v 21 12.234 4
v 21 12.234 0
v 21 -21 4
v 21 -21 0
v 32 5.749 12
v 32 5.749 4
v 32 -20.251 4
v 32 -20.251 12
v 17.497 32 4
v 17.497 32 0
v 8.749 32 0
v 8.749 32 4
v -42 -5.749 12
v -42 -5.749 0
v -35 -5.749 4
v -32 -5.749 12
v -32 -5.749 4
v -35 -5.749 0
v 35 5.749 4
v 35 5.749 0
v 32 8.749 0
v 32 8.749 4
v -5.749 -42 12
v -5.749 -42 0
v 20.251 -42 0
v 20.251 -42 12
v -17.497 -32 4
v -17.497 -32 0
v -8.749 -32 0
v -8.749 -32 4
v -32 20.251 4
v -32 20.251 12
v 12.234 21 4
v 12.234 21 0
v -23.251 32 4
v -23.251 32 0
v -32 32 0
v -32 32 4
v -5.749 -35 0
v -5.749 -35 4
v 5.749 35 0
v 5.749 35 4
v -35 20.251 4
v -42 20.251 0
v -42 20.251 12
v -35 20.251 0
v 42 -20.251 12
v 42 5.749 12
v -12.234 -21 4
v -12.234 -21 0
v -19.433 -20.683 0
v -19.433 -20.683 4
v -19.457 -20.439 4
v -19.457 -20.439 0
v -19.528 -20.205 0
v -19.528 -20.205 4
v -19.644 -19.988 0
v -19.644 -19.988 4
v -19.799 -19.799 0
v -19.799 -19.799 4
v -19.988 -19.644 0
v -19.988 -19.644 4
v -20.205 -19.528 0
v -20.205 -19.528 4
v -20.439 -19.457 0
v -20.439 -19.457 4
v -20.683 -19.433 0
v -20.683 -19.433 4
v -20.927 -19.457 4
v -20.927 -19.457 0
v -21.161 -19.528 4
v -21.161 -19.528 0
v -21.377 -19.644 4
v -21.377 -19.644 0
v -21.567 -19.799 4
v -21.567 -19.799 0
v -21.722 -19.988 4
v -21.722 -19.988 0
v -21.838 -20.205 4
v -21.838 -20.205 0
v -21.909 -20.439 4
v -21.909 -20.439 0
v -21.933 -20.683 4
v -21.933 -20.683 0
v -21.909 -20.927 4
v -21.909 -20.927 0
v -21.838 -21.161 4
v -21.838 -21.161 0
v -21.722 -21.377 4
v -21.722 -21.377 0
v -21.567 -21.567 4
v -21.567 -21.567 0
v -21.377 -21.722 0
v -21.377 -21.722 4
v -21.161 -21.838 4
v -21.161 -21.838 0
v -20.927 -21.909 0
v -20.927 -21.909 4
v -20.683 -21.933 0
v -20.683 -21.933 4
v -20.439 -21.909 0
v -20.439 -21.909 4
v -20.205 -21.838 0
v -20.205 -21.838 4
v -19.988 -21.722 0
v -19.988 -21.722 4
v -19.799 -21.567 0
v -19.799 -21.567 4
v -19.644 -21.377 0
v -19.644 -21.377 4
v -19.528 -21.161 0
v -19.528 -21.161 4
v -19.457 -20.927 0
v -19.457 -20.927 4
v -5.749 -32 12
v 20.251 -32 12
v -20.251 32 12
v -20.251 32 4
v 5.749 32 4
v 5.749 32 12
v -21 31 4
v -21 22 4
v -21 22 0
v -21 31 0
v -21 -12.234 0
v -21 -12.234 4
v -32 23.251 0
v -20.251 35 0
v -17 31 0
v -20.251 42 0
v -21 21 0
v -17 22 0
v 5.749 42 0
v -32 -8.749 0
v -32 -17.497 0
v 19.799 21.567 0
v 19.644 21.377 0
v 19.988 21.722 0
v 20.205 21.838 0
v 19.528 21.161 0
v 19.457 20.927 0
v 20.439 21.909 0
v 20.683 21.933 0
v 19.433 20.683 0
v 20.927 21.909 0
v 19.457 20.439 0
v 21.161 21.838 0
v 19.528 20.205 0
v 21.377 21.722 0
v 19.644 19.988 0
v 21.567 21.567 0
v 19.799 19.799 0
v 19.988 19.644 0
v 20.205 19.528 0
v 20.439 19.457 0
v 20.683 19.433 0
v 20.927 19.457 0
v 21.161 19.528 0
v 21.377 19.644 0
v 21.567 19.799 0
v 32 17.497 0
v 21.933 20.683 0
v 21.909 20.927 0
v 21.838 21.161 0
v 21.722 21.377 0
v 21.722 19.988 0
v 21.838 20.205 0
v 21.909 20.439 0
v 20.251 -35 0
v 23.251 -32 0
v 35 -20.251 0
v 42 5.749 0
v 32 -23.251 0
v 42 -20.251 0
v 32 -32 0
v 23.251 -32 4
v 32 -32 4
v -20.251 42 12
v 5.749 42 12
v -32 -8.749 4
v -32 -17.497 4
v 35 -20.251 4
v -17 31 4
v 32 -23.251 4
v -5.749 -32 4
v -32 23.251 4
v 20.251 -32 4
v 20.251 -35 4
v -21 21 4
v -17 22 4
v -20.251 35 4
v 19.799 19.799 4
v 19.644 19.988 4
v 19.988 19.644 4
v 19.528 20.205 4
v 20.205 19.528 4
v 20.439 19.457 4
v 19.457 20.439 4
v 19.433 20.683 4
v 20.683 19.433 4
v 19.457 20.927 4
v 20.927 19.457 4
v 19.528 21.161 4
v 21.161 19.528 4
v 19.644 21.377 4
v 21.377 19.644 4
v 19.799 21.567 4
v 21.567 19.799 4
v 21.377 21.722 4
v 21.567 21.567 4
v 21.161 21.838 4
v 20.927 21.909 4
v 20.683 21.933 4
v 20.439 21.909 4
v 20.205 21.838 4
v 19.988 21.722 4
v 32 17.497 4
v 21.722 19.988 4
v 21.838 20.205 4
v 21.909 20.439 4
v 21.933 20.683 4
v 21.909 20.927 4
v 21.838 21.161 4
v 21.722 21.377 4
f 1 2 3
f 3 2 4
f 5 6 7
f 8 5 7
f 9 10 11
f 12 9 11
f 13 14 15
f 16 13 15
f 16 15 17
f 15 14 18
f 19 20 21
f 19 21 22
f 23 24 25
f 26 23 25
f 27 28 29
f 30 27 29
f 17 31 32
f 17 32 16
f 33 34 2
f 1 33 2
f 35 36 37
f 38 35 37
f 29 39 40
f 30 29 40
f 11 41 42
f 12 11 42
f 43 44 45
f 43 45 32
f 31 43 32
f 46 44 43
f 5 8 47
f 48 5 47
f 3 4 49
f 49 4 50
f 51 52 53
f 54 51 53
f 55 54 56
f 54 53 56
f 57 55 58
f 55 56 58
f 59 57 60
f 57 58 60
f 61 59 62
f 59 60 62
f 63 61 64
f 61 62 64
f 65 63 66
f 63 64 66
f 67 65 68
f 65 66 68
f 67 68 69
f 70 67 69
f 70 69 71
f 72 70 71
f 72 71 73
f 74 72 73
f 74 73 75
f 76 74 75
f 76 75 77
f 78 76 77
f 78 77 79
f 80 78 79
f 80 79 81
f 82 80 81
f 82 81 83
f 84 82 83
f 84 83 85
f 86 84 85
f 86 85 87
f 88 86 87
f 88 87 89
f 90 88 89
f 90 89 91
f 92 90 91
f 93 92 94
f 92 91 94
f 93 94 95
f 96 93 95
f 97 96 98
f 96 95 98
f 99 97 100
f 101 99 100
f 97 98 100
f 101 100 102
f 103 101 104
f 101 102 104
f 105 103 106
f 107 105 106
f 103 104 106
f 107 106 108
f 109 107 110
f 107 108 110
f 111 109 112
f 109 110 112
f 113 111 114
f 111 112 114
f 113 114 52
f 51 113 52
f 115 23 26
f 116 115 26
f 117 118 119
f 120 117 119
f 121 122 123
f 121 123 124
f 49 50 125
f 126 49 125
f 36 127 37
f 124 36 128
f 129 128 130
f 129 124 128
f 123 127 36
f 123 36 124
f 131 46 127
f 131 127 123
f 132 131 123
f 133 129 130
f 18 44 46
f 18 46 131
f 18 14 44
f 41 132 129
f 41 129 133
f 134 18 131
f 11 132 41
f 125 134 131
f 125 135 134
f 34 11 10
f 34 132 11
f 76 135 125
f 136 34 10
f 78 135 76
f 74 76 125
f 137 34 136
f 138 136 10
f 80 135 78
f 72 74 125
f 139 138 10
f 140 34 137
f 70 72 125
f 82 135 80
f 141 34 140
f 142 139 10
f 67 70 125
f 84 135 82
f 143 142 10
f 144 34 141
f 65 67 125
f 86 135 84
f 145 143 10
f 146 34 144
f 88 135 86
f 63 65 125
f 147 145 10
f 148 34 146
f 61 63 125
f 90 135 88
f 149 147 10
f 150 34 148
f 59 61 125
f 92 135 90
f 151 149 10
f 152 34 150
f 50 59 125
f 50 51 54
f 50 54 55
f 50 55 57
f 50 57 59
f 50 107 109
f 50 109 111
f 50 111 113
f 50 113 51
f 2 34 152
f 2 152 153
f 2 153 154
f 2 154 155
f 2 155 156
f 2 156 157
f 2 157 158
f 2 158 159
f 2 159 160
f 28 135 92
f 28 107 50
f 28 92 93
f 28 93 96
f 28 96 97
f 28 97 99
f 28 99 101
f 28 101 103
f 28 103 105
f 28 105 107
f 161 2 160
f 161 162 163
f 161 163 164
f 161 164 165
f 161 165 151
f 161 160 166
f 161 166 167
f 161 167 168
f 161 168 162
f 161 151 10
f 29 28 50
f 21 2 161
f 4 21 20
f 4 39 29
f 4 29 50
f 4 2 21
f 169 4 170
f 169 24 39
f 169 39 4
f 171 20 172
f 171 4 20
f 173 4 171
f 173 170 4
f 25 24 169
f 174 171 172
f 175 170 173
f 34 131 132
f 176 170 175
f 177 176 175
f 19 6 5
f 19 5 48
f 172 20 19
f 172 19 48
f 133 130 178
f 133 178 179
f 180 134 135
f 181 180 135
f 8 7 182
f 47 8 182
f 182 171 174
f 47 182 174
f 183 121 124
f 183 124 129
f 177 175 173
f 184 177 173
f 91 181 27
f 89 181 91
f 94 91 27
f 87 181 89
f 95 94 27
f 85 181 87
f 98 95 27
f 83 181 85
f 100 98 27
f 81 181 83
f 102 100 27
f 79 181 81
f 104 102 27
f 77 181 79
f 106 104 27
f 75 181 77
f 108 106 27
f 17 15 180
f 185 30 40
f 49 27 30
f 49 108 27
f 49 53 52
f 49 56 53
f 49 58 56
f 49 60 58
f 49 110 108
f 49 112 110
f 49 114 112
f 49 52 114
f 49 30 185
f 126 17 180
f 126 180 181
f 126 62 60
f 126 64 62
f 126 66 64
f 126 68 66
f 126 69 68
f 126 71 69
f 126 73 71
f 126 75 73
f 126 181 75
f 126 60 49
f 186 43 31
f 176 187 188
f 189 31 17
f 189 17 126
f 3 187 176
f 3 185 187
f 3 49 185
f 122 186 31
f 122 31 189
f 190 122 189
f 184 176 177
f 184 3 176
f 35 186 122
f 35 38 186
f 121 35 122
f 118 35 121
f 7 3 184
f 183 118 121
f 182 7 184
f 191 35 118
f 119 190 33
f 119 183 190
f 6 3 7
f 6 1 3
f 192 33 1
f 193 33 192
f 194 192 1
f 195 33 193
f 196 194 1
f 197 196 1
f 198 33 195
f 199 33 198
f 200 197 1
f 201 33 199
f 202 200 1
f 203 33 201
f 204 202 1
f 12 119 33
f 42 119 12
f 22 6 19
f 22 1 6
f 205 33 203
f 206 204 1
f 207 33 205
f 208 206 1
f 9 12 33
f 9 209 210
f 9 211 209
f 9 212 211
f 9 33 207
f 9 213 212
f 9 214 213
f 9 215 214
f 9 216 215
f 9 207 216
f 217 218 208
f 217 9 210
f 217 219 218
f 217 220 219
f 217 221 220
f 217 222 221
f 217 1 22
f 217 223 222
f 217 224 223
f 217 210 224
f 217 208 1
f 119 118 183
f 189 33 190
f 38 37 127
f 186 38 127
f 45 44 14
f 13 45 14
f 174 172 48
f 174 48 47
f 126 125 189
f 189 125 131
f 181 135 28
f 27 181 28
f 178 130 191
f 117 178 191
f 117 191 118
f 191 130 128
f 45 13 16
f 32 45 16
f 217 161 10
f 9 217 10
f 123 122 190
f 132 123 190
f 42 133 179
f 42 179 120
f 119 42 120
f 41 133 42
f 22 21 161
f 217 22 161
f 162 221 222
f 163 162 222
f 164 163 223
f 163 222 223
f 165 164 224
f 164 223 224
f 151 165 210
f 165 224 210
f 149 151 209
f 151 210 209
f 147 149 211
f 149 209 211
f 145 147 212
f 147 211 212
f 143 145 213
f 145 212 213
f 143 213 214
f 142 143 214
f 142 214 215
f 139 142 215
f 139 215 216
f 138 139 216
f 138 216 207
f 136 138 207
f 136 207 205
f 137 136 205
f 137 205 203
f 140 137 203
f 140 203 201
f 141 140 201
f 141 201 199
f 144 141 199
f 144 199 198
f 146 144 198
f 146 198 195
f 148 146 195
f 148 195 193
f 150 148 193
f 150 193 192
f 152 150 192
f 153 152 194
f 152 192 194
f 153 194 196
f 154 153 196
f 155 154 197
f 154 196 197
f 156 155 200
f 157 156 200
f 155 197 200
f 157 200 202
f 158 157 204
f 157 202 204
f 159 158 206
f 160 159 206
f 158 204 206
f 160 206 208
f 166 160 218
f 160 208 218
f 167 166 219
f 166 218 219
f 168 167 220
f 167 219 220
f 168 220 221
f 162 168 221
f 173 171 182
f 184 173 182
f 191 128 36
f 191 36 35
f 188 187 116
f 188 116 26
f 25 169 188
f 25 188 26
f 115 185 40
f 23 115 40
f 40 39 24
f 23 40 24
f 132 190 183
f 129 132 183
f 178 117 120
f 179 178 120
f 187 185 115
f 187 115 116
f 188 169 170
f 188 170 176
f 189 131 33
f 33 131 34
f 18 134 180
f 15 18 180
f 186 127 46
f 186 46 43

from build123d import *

# Parameters (mm, degrees)
F1_DEPTH = 4
F2_R     = 1.25
F3_DEPTH = 4.001
F4_W     = 4
F4_H     = 9
F5_DEPTH = 4.001
F6_W     = 10
F6_H     = 26
F6_W_2   = 26
F6_H_2   = 10
F7_DEPTH = 12
F8_SIZE  = 3


with BuildPart() as f1:
    # F0 (on Top) → F1 (new body)
    with BuildSketch(Plane.XY):
        Polygon((17.4974746831, 32), (-32, 32), (-32, -17.4974746831), (-17.4974746831, -32), (32, -32), (32, 17.4974746831), align=None)
        Polygon((-21, -12.2340187158), (-21, 21), (12.2340187158, 21), (21, 21), (21, 12.2340187158), (21, -21), (-12.2340187158, -21), (-21, -21), align=None, mode=Mode.SUBTRACT)
        Polygon((-12.2340187158, -21), (-21, -12.2340187158), (-21, -21), align=None)
        Polygon((21, 21), (12.2340187158, 21), (21, 12.2340187158), align=None)
    extrude(amount=F1_DEPTH)

    # F2 (on face) → F3 (cut, through all)
    with BuildSketch(Plane.XY.offset(4)):
        with Locations((-20.6828733497, -20.6828733497)):
            Circle(F2_R)
        with Locations((20.6828733497, 20.6828733497)):
            Circle(F2_R)
    extrude(amount=-F3_DEPTH, mode=Mode.SUBTRACT)

    # F4 (on face) → F5 (cut, through all)
    with BuildSketch(Plane.XY.offset(4)):
        with Locations((-19, 26.5)):
            Rectangle(F4_W, F4_H)
    extrude(amount=-F5_DEPTH, mode=Mode.SUBTRACT)

    # F6 (on face) → F7 (join)
    with BuildSketch(Plane(origin=(0, 0, 0), x_dir=(1, 0, 0), z_dir=(0, 0, -1))):
        with Locations((-37, -7.2512626585)):
            Rectangle(F6_W, F6_H)
        with Locations((7.2512626585, 37)):
            Rectangle(F6_W_2, F6_H_2)
        with Locations((37, 7.2512626585)):
            Rectangle(F6_W, F6_H)
        with Locations((-7.2512626585, -37)):
            Rectangle(F6_W_2, F6_H_2)
    extrude(amount=-F7_DEPTH)

    # F8
    f8_edges = [f1.edges().sort_by_distance(p)[0] for p in [
        (32, 5.748737, 2),
        (32, -20.251263, 2),
        (20.251263, -32, 2),
        (-5.748737, -32, 2),
        (-32, -5.748737, 2),
        (-32, 20.251263, 2),
        (-20.251263, 32, 2),
        (5.748737, 32, 2),
    ]]
    chamfer(f8_edges, length=F8_SIZE)


solid = f1.part
